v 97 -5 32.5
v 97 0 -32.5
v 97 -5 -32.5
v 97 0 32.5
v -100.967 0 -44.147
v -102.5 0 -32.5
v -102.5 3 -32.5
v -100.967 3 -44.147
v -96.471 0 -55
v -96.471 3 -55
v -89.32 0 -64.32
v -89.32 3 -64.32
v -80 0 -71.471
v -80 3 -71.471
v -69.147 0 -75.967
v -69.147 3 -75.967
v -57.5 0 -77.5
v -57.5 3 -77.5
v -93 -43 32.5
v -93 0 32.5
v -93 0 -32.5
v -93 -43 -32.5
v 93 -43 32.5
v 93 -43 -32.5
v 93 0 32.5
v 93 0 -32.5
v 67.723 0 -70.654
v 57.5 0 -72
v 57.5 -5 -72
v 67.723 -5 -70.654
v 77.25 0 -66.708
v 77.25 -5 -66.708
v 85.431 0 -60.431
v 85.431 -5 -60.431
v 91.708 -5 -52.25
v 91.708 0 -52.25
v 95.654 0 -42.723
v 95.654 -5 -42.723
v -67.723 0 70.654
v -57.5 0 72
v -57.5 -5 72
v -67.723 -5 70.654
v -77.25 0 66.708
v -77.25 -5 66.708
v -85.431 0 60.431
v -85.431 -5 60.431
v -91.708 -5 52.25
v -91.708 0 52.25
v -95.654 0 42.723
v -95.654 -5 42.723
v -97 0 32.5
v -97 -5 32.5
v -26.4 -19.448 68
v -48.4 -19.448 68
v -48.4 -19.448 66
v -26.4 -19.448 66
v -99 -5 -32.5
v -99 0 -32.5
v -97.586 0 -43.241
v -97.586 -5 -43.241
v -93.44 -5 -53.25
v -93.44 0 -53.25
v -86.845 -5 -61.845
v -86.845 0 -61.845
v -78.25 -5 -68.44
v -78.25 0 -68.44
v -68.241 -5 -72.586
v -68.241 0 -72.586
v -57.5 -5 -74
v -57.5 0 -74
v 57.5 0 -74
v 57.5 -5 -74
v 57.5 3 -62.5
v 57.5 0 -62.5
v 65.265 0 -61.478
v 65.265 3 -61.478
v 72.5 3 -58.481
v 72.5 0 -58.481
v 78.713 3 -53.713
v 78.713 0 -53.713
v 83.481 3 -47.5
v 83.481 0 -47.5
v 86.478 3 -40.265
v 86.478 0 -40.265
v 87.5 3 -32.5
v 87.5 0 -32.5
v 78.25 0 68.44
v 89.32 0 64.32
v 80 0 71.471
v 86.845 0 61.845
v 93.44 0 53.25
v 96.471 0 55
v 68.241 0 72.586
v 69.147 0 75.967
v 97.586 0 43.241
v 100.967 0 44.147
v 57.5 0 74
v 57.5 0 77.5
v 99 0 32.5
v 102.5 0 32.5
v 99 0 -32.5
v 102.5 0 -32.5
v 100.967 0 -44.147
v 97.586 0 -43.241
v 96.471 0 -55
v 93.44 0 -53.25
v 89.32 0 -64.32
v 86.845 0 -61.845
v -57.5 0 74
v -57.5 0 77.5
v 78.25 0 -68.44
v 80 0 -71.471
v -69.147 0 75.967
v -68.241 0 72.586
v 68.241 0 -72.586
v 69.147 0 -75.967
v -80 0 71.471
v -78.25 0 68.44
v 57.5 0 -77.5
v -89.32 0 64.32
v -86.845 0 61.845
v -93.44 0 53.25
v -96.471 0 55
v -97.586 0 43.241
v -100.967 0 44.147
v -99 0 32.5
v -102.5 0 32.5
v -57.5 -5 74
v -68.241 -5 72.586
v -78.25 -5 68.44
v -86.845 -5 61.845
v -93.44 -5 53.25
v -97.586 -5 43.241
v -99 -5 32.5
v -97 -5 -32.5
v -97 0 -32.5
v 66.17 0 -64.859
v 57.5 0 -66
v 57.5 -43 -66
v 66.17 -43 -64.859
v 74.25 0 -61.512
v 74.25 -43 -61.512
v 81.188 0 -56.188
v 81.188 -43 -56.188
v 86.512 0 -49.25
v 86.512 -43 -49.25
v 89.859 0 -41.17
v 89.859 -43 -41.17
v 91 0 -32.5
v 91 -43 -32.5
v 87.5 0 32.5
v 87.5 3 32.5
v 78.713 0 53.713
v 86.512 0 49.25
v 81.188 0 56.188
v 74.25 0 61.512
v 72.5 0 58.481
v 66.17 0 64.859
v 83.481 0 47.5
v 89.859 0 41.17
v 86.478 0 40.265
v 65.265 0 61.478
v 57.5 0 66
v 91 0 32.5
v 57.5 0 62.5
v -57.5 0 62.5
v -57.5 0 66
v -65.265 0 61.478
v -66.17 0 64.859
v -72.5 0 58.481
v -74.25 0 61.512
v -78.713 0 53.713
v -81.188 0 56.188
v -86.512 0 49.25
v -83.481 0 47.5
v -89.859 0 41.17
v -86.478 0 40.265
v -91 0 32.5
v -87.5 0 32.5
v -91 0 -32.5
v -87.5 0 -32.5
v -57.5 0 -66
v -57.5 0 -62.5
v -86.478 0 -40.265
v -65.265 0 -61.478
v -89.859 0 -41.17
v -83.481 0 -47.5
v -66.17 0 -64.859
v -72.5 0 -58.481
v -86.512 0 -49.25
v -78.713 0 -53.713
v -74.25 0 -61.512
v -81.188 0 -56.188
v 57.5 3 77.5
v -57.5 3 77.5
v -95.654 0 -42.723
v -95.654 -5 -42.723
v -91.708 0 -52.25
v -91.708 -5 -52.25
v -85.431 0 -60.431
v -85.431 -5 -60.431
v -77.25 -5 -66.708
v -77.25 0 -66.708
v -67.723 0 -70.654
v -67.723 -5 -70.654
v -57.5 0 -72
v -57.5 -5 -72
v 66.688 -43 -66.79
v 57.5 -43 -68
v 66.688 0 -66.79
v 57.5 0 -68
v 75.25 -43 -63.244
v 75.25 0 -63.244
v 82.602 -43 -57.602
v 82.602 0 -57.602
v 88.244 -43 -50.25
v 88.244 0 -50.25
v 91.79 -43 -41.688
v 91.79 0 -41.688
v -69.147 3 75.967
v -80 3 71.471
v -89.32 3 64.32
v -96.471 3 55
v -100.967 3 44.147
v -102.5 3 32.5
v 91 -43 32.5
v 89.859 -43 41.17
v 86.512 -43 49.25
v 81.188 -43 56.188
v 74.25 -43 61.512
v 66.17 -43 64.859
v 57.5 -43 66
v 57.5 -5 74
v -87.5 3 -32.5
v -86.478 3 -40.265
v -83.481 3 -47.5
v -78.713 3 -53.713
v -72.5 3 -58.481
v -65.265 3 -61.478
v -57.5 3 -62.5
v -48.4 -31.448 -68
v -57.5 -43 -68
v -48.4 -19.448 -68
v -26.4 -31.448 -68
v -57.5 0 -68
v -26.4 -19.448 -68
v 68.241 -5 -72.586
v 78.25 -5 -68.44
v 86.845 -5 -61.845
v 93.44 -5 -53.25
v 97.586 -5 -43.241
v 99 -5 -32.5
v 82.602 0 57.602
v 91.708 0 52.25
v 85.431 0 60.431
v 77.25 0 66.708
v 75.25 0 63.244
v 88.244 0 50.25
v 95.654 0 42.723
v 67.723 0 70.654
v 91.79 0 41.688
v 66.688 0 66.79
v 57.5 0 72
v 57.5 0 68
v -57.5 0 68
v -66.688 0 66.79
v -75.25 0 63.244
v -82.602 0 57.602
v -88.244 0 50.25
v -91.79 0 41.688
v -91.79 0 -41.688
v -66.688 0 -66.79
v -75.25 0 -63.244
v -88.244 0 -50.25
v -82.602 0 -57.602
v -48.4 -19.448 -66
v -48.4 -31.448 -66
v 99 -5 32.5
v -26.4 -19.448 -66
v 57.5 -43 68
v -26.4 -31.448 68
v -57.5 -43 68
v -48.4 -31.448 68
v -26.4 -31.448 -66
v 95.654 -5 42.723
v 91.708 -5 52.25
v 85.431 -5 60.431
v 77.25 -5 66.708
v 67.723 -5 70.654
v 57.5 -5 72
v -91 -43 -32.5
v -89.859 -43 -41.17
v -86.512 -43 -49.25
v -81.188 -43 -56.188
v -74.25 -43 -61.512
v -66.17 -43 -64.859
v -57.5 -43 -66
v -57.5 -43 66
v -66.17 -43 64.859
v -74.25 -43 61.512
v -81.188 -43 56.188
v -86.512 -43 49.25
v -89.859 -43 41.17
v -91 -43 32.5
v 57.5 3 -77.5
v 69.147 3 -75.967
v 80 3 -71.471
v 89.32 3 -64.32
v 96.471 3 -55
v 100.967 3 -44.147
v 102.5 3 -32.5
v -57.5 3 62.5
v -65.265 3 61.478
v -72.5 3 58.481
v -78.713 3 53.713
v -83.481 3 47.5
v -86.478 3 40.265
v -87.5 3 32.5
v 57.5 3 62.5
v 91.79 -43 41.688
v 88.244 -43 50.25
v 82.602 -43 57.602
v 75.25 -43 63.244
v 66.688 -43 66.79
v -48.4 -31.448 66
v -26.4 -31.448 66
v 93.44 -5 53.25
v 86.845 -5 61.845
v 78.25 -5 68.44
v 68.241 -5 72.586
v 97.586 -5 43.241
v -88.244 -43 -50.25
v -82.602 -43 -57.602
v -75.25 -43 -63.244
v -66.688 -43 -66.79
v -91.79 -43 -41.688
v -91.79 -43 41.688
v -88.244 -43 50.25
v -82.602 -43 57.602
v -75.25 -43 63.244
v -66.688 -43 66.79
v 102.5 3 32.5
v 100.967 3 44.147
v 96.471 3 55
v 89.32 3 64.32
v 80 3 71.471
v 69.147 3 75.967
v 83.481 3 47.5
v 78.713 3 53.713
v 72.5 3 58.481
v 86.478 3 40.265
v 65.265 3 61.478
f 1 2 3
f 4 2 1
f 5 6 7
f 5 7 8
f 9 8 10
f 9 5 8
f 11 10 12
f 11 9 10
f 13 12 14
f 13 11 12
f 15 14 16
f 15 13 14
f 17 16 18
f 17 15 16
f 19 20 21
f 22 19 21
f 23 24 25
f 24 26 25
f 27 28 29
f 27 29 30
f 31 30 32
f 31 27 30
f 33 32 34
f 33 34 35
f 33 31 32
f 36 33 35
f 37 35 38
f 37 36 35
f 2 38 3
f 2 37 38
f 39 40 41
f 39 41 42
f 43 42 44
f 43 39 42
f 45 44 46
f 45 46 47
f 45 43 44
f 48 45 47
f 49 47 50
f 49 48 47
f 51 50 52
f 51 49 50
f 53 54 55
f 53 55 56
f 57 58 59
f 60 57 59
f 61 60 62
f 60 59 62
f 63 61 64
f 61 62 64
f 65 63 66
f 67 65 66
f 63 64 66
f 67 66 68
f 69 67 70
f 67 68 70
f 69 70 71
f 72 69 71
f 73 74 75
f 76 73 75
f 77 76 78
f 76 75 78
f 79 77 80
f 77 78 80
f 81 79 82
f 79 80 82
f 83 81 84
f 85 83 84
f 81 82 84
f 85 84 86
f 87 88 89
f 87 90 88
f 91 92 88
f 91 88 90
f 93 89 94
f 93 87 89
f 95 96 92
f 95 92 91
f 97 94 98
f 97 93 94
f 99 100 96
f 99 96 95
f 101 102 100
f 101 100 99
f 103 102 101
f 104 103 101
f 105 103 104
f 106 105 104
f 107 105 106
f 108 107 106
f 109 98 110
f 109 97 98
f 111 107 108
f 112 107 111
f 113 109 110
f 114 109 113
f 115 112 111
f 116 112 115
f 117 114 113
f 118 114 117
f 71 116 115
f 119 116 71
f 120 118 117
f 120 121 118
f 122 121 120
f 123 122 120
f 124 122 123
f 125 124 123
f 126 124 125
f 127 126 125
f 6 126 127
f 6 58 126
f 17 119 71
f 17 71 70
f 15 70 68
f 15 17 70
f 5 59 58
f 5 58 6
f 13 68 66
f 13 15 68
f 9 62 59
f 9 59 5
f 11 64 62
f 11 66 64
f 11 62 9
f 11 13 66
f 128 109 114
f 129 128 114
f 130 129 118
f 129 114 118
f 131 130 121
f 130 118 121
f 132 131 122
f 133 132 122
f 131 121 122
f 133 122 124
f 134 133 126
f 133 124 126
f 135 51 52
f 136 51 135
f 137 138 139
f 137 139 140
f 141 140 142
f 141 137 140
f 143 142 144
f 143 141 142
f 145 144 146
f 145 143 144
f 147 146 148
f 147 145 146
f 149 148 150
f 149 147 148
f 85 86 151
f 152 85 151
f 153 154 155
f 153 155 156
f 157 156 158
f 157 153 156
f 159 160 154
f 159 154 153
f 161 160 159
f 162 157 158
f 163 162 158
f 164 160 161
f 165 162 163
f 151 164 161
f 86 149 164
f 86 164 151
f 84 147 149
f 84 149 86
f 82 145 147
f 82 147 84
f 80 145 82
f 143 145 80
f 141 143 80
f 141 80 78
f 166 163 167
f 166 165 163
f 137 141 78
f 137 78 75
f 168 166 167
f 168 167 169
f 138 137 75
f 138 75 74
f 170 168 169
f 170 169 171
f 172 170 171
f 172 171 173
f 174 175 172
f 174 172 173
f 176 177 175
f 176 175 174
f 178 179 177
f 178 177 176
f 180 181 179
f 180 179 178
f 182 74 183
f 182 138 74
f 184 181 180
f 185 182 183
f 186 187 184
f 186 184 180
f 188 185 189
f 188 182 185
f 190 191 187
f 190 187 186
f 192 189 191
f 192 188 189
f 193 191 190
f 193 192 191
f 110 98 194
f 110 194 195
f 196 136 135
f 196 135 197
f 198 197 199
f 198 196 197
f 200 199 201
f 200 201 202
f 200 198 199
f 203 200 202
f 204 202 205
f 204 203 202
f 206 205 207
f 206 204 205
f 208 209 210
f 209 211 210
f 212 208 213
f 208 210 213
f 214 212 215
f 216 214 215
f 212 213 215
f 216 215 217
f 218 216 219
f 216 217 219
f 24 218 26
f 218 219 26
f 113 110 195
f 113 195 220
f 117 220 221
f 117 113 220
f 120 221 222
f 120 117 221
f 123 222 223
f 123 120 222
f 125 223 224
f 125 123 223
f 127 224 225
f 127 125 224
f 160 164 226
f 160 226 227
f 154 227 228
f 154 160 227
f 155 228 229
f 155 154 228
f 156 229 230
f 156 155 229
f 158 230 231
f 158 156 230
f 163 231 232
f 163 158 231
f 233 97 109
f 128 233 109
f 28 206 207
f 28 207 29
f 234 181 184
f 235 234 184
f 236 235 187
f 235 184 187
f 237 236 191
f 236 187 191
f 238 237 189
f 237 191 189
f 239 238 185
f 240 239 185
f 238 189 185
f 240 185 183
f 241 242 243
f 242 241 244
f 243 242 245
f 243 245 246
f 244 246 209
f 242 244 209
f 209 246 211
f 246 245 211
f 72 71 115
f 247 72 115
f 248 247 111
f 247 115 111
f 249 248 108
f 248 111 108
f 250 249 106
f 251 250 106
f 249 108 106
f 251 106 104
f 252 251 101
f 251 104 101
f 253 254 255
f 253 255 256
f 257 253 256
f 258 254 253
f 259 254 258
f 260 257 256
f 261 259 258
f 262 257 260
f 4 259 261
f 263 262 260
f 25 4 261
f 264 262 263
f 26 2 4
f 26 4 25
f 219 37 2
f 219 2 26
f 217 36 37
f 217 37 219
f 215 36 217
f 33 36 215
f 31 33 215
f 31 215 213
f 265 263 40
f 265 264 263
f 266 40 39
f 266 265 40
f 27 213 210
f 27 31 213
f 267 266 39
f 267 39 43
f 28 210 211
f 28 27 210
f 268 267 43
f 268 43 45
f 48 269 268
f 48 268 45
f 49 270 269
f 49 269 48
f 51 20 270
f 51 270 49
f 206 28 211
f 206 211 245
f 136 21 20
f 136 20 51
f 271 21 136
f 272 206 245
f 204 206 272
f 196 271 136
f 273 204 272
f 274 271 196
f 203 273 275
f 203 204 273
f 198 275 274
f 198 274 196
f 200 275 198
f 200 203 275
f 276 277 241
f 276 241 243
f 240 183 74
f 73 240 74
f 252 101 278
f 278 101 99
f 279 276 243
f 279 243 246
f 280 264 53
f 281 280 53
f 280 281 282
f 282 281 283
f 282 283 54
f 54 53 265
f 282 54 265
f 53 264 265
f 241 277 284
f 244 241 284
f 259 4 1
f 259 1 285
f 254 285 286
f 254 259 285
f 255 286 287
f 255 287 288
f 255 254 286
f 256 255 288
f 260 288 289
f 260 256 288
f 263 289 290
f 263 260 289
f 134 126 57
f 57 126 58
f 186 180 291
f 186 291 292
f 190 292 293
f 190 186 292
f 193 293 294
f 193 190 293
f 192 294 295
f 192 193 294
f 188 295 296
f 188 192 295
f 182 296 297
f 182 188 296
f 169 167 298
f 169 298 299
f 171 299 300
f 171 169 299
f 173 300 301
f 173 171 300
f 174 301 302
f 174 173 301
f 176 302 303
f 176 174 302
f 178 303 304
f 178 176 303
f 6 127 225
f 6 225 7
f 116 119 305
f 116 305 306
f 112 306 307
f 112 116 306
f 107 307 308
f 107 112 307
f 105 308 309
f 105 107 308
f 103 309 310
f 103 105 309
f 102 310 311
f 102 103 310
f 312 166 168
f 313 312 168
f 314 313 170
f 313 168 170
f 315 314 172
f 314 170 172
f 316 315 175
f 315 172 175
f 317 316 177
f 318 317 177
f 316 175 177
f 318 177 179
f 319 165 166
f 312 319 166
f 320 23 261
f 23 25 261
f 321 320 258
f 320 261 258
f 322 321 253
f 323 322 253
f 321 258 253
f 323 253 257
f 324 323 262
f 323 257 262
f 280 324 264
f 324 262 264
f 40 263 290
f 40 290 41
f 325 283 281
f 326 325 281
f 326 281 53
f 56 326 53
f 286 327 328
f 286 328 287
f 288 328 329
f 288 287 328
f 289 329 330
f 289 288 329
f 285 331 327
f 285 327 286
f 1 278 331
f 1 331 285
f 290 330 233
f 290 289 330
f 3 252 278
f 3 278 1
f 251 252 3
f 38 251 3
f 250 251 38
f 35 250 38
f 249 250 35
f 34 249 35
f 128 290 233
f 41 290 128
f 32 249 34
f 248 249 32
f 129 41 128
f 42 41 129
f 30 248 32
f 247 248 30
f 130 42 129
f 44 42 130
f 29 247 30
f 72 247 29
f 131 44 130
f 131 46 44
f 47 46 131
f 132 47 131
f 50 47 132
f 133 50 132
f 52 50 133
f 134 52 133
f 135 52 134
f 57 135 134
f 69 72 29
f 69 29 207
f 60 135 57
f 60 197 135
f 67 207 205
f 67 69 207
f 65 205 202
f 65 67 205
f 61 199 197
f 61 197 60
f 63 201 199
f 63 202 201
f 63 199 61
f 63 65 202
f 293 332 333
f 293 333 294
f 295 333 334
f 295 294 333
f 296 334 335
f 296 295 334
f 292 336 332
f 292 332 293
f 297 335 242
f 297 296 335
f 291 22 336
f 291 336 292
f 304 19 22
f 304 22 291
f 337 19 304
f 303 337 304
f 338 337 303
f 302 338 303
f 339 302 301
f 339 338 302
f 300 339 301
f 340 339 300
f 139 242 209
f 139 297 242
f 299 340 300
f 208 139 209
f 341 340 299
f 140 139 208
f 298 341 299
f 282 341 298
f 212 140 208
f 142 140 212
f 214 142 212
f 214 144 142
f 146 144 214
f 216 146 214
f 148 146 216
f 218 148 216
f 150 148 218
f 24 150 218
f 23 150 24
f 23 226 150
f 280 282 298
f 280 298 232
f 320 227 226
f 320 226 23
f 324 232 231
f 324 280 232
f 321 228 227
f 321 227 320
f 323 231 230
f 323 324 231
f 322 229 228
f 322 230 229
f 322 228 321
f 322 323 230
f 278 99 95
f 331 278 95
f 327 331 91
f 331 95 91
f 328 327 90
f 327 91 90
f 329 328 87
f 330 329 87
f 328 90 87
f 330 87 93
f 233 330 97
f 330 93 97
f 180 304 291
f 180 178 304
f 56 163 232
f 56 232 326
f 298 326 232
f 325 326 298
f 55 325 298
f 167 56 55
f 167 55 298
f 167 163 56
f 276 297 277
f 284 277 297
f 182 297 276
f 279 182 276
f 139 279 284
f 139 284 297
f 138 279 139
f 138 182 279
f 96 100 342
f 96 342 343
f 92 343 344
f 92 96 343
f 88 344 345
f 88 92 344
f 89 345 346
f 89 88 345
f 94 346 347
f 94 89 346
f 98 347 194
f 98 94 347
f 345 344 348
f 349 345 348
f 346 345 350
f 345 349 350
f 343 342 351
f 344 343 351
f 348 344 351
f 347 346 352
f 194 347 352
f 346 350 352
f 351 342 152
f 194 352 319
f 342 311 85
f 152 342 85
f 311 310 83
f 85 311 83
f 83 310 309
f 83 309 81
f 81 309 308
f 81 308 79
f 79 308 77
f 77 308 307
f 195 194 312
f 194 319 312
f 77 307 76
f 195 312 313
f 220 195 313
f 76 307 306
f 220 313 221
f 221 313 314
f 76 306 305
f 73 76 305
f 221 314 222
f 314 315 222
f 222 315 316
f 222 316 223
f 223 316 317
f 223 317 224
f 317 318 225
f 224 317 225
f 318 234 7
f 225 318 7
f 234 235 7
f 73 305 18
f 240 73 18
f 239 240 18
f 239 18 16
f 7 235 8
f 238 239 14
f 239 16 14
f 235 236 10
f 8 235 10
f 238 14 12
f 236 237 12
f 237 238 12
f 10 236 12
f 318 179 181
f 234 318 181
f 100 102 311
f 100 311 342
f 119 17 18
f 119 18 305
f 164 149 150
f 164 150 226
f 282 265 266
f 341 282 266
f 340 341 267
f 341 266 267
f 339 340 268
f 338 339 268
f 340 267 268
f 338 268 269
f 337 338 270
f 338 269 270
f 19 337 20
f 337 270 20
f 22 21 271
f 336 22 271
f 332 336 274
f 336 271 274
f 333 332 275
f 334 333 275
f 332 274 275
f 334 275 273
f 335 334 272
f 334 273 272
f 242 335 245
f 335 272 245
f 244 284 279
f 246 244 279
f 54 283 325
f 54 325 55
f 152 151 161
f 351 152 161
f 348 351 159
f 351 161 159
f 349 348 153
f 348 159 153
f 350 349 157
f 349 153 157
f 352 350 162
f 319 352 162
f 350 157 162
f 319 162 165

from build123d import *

# Parameters (mm, degrees)
BOSS_EXTRUDE1_DEPTH = 3
BOSS_EXTRUDE2_DEPTH = 5
BOSS_EXTRUDE3_DEPTH = 38
SKETCH4_W           = 22
SKETCH4_H           = 12
CUT_EXTRUDE1_DEPTH  = 461


with BuildPart() as part:
    # Sketch1 → Boss-Extrude1 (new body)
    with BuildSketch(Plane(origin=(0, 0, 0), x_dir=(1, 0, 0), z_dir=(0, 1, 0))):
        with BuildLine():
            Line((57.5, 77.5), (-57.5, 77.5))
            ThreePointArc((-57.5, 77.5), (-89.319805153, 64.319805153), (-102.5, 32.5))
            Line((-102.5, 32.5), (-102.5, -32.5))
            ThreePointArc((-102.5, -32.5), (-89.319805153, -64.319805153), (-57.5, -77.5))
            Line((-57.5, -77.5), (57.5, -77.5))
            ThreePointArc((57.5, -77.5), (89.319805153, -64.319805153), (102.5, -32.5))
            Line((102.5, -32.5), (102.5, 32.5))
            ThreePointArc((102.5, 32.5), (89.319805153, 64.319805153), (57.5, 77.5))
        make_face()
        with BuildLine():
            Line((57.5, -62.5), (-57.5, -62.5))
            ThreePointArc((-57.5, -62.5), (-78.713203436, -53.713203436), (-87.5, -32.5))
            Line((-87.5, -32.5), (-87.5, 32.5))
            ThreePointArc((-87.5, 32.5), (-78.713203436, 53.713203436), (-57.5, 62.5))
            Line((-57.5, 62.5), (57.5, 62.5))
            ThreePointArc((57.5, 62.5), (78.713203436, 53.713203436), (87.5, 32.5))
            Line((87.5, 32.5), (87.5, -32.5))
            ThreePointArc((87.5, -32.5), (78.713203436, -53.713203436), (57.5, -62.5))
        make_face(mode=Mode.SUBTRACT)
    extrude(amount=BOSS_EXTRUDE1_DEPTH)

    # Sketch1<4> → Boss-Extrude2 (add)
    # profile 1 of 2: a face of its own
    with BuildSketch(Plane(origin=(0, 0, 0), x_dir=(1, 0, 0), z_dir=(0, 1, 0))):
        with BuildLine():
            Line((57.5, 74), (-57.5, 74))
            ThreePointArc((-57.5, 74), (-86.844931419, 61.844931419), (-99, 32.5))
            Line((-99, 32.5), (-99, -32.5))
            ThreePointArc((-99, -32.5), (-86.844931419, -61.844931419), (-57.5, -74))
            Line((-57.5, -74), (57.5, -74))
            ThreePointArc((57.5, -74), (86.844931419, -61.844931419), (99, -32.5))
            Line((99, -32.5), (99, 32.5))
            ThreePointArc((99, 32.5), (86.844931419, 61.844931419), (57.5, 74))
        make_face()
        with BuildLine():
            ThreePointArc((-97, 32.5), (-85.430717857, 60.430717857), (-57.5, 72))
            Line((-57.5, 72), (57.5, 72))
            ThreePointArc((57.5, 72), (85.430717857, 60.430717857), (97, 32.5))
            Line((97, 32.5), (97, -32.5))
            ThreePointArc((97, -32.5), (85.430717857, -60.430717857), (57.5, -72))
            Line((57.5, -72), (-57.5, -72))
            ThreePointArc((-57.5, -72), (-85.430717857, -60.430717857), (-97, -32.5))
            Line((-97, -32.5), (-97, 32.5))
        make_face(mode=Mode.SUBTRACT)
    # profile 2 of 2: a face of its own
    with BuildSketch(Plane(origin=(0, 0, 0), x_dir=(1, 0, 0), z_dir=(0, 1, 0))):
        with BuildLine():
            Line((57.5, 68), (-57.5, 68))
            ThreePointArc((-57.5, 68), (-82.602290732, 57.602290732), (-93, 32.5))
            Line((-93, 32.5), (-93, -32.5))
            ThreePointArc((-93, -32.5), (-82.602290732, -57.602290732), (-57.5, -68))
            Line((-57.5, -68), (57.5, -68))
            ThreePointArc((57.5, -68), (82.602290732, -57.602290732), (93, -32.5))
            Line((93, -32.5), (93, 32.5))
            ThreePointArc((93, 32.5), (82.602290732, 57.602290732), (57.5, 68))
        make_face()
        with BuildLine():
            ThreePointArc((-91, 32.5), (-81.18807717, 56.18807717), (-57.5, 66))
            Line((-57.5, 66), (57.5, 66))
            ThreePointArc((57.5, 66), (81.18807717, 56.18807717), (91, 32.5))
            Line((91, 32.5), (91, -32.5))
            ThreePointArc((91, -32.5), (81.18807717, -56.18807717), (57.5, -66))
            Line((57.5, -66), (-57.5, -66))
            ThreePointArc((-57.5, -66), (-81.18807717, -56.18807717), (-91, -32.5))
            Line((-91, -32.5), (-91, 32.5))
        make_face(mode=Mode.SUBTRACT)
    extrude(amount=-BOSS_EXTRUDE2_DEPTH)

    # Sketch2 → Boss-Extrude3 (add)
    with BuildSketch(Plane.XZ.offset(5)):
        with BuildLine():
            Line((-57.5, -68), (57.5, -68))
            ThreePointArc((57.5, -68), (82.602290732, -57.602290732), (93, -32.5))
            Line((93, -32.5), (93, 32.5))
            ThreePointArc((93, 32.5), (82.602290732, 57.602290732), (57.5, 68))
            Line((57.5, 68), (-57.5, 68))
            ThreePointArc((-57.5, 68), (-82.602290732, 57.602290732), (-93, 32.5))
            Line((-93, 32.5), (-93, -32.5))
            ThreePointArc((-93, -32.5), (-82.602290732, -57.602290732), (-57.5, -68))
        make_face()
        with BuildLine():
            Line((-91, 32.5), (-91, -32.5))
            ThreePointArc((-91, -32.5), (-81.18807717, -56.18807717), (-57.5, -66))
            Line((-57.5, -66), (57.5, -66))
            ThreePointArc((57.5, -66), (81.18807717, -56.18807717), (91, -32.5))
            Line((91, -32.5), (91, 32.5))
            ThreePointArc((91, 32.5), (81.18807717, 56.18807717), (57.5, 66))
            Line((57.5, 66), (-57.5, 66))
            ThreePointArc((-57.5, 66), (-81.18807717, 56.18807717), (-91, 32.5))
        make_face(mode=Mode.SUBTRACT)
    extrude(amount=BOSS_EXTRUDE3_DEPTH)

    # Sketch4 → Cut-Extrude1 (cut)
    with BuildSketch(Plane.XY.offset(68)):
        with Locations((-37.400499866, -25.448136165)):
            Rectangle(SKETCH4_W, SKETCH4_H)
    extrude(amount=-CUT_EXTRUDE1_DEPTH, mode=Mode.SUBTRACT)


solid = part.part
